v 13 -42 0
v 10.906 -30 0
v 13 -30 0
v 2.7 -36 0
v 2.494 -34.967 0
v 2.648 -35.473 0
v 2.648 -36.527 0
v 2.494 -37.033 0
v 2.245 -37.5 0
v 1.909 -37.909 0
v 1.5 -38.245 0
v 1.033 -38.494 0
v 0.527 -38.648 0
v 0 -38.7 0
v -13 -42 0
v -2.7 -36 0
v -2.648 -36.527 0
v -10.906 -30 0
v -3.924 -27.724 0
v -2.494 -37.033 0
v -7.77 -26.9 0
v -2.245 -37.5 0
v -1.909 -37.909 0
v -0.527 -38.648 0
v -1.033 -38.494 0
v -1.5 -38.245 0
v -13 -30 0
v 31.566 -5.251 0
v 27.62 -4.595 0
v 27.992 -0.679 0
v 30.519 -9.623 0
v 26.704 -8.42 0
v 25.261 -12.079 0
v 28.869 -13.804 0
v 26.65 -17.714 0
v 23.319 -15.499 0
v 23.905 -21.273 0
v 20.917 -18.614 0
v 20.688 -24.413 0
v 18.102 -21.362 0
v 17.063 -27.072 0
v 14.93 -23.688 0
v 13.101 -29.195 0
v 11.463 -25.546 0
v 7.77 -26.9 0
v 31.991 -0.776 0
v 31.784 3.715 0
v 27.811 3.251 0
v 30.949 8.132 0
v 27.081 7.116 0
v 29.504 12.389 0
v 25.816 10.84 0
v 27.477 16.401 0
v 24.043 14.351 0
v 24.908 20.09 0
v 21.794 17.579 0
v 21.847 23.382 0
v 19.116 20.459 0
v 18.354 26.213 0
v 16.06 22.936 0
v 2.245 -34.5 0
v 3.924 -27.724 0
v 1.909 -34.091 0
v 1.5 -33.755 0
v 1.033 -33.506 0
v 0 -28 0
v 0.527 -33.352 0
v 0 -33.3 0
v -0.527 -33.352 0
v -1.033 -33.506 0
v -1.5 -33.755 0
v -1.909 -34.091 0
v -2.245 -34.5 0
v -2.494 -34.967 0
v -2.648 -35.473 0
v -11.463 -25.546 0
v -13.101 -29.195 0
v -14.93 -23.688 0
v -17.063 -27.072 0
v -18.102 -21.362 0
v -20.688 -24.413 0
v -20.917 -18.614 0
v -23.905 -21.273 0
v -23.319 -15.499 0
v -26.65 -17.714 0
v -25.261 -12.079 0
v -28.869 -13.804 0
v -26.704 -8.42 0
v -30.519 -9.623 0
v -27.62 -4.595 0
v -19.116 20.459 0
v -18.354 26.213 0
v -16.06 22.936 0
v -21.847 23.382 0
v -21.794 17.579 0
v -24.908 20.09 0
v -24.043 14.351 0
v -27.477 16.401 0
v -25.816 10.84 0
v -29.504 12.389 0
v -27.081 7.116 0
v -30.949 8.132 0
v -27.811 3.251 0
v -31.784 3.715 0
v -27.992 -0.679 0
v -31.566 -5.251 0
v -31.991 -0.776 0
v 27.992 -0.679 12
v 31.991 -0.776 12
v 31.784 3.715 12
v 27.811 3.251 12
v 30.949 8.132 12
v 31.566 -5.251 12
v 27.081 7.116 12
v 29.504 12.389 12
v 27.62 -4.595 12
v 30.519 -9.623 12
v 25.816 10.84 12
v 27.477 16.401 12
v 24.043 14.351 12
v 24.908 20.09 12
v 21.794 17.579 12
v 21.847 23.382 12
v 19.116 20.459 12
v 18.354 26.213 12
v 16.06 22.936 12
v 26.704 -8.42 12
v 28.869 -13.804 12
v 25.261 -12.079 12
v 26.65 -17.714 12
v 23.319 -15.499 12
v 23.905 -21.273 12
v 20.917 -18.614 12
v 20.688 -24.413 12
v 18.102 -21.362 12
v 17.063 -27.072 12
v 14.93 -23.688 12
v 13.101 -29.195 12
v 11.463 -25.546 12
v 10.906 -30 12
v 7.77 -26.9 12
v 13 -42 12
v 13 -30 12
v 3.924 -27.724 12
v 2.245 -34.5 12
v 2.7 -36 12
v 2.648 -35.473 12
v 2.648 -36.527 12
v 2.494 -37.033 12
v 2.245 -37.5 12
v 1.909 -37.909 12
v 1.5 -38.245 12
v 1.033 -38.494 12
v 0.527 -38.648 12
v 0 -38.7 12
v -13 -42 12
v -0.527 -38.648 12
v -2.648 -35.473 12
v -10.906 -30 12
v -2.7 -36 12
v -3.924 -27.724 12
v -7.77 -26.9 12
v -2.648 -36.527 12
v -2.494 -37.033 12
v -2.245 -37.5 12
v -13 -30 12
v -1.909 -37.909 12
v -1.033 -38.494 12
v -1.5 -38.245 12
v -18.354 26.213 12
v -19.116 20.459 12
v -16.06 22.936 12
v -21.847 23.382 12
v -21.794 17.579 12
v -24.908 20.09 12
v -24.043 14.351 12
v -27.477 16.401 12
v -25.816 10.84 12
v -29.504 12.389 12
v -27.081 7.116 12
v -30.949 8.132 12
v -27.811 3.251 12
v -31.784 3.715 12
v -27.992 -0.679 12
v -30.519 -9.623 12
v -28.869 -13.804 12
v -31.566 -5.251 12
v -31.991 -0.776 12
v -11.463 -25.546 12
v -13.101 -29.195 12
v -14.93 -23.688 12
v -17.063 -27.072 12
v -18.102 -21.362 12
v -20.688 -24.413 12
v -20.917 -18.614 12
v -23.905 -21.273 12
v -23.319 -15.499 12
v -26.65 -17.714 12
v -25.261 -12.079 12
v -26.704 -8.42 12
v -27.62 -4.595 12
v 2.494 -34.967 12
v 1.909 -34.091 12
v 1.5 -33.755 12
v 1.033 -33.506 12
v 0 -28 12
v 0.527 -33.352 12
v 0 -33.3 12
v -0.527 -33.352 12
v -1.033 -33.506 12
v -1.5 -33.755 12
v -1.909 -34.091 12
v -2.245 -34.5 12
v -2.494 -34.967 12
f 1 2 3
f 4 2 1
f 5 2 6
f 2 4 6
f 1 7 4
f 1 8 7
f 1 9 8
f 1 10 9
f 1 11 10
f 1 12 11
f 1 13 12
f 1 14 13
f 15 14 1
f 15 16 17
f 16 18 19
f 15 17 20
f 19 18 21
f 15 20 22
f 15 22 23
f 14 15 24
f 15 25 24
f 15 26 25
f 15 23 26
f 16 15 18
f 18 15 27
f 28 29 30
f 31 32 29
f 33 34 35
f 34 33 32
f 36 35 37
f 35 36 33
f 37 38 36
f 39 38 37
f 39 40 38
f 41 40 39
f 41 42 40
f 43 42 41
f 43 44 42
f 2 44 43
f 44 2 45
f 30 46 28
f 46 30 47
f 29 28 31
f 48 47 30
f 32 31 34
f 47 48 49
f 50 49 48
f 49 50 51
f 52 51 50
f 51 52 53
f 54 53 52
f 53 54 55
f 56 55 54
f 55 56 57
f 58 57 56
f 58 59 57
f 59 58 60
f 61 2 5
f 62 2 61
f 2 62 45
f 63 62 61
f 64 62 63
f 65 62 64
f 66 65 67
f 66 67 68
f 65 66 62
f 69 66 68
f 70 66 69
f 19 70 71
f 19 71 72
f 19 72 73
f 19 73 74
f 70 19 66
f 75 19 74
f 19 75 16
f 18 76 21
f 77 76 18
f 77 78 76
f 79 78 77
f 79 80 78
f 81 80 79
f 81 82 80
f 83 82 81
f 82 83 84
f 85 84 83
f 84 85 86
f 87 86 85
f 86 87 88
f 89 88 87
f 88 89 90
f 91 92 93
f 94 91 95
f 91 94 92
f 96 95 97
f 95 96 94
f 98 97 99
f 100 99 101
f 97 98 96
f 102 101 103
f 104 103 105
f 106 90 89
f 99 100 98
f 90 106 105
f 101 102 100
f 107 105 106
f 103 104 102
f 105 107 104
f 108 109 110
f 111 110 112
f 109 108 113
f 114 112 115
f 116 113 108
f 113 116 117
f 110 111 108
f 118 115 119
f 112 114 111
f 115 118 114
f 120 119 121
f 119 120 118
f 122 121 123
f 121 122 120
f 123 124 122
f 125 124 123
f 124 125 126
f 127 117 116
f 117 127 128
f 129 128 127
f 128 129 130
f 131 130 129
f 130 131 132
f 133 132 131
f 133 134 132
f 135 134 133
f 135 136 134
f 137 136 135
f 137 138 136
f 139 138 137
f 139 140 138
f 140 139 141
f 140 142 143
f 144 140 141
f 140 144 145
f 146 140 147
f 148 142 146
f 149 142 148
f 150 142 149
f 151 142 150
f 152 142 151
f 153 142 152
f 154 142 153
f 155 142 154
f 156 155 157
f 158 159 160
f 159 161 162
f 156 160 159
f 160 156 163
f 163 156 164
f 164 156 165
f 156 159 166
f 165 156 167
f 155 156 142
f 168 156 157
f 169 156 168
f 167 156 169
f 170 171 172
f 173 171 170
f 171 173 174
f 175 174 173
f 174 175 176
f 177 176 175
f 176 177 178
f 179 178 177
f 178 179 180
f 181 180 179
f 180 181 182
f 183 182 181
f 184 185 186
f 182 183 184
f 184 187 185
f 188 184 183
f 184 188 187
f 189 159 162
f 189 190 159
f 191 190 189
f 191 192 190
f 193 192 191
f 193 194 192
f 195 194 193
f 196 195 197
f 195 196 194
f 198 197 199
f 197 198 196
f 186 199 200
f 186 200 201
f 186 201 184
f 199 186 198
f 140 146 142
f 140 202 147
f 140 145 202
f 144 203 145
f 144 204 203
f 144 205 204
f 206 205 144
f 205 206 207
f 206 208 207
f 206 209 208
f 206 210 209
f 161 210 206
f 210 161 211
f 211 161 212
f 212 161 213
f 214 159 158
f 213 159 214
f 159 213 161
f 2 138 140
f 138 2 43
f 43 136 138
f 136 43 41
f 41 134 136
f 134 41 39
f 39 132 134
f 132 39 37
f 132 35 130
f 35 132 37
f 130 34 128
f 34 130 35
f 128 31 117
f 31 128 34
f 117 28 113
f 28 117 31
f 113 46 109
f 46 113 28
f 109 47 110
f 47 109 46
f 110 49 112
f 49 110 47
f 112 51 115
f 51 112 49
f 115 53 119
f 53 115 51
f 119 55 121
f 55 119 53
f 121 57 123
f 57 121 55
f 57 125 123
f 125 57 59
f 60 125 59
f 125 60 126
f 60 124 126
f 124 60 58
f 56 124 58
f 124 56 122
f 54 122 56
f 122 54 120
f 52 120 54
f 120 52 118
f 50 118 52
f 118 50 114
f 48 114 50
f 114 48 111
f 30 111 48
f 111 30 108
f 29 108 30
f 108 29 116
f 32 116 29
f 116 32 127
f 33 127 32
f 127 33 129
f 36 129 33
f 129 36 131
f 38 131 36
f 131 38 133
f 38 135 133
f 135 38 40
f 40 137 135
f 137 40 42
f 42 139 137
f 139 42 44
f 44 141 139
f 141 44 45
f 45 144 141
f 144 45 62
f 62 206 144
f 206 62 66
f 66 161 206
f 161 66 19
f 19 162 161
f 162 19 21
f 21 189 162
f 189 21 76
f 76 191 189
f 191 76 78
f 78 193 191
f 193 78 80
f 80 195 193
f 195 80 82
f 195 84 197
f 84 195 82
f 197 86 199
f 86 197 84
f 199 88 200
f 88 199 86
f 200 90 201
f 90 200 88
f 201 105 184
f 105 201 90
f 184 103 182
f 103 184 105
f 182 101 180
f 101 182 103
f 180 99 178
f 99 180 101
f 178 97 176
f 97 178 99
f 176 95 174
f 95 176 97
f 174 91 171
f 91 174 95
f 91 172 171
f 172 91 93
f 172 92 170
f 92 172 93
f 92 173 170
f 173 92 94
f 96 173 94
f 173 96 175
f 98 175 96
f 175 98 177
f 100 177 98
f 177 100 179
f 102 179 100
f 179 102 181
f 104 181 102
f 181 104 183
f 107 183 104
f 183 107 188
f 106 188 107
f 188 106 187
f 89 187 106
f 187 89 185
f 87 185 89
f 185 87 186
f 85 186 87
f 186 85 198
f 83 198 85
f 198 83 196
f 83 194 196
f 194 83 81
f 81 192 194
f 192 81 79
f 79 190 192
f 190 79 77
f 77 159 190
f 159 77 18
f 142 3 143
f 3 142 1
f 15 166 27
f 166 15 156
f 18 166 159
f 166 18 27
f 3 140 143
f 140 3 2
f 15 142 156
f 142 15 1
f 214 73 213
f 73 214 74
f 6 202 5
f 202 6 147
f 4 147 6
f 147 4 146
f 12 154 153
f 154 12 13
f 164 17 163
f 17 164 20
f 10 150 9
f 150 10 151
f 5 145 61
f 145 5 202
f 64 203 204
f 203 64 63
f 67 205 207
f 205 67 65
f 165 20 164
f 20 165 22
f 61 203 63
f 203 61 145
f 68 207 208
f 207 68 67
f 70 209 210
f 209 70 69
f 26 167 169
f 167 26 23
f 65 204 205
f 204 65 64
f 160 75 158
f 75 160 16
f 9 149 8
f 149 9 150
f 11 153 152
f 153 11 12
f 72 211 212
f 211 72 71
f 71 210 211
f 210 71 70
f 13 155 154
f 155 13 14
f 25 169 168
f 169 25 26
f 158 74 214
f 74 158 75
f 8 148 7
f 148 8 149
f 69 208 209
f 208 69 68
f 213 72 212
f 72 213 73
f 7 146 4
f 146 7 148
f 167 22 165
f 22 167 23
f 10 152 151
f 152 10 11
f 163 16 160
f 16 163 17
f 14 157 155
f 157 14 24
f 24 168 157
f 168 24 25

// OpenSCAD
$fn = 32;

// ----------------------------------------------------------------------
// Spring clip: 64 mm outside, 4 mm band, 70 degree opening
// ----------------------------------------------------------------------

// --- parameters (mm) ---
outer_r = 32;             // clip outside radius
inner_r = 28;             // clip bore radius
band = 4;                 // band thickness
clip_w = 12;              // clip width
opening = 70;             // opening angle
tab_w = 26;               // tab width
tab_len = 10;             // tab length past the clip
tab_hole = 5.4;           // tab fixing hole

clip_profile = [[-18.354, 26.213], [-21.847, 23.382], [-24.908, 20.09], [-27.477, 16.401], [-29.504, 12.389], [-30.949, 8.132], [-31.784, 3.715], [-31.991, -0.776], [-31.566, -5.251], [-30.519, -9.623], [-28.869, -13.804], [-26.65, -17.714], [-23.905, -21.273], [-20.688, -24.413], [-17.063, -27.072], [-13.101, -29.195], [-8.88, -30.743], [-4.484, -31.684], [0, -32], [4.484, -31.684], [8.88, -30.743], [13.101, -29.195], [17.063, -27.072], [20.688, -24.413], [23.905, -21.273], [26.65, -17.714], [28.869, -13.804], [30.519, -9.623], [31.566, -5.251], [31.991, -0.776], [31.784, 3.715], [30.949, 8.132], [29.504, 12.389], [27.477, 16.401], [24.908, 20.09], [21.847, 23.382], [18.354, 26.213], [16.06, 22.936], [19.116, 20.459], [21.794, 17.579], [24.043, 14.351], [25.816, 10.84], [27.081, 7.116], [27.811, 3.251], [27.992, -0.679], [27.62, -4.595], [26.704, -8.42], [25.261, -12.079], [23.319, -15.499], [20.917, -18.614], [18.102, -21.362], [14.93, -23.688], [11.463, -25.546], [7.77, -26.9], [3.924, -27.724], [0, -28], [-3.924, -27.724], [-7.77, -26.9], [-11.463, -25.546], [-14.93, -23.688], [-18.102, -21.362], [-20.917, -18.614], [-23.319, -15.499], [-25.261, -12.079], [-26.704, -8.42], [-27.62, -4.595], [-27.992, -0.679], [-27.811, 3.251], [-27.081, 7.116], [-25.816, 10.84], [-24.043, 14.351], [-21.794, 17.579], [-19.116, 20.459], [-16.06, 22.936]];

difference() {
  union() {
    linear_extrude(height = clip_w) polygon(clip_profile);
    /* mounting tab, sunk 2 mm into the band */
    translate([-13, -42, 0]) cube([tab_w, 12, clip_w]);
  }
  translate([0, -36, -2.5]) cylinder(h = clip_w + 5, d = tab_hole);
}
